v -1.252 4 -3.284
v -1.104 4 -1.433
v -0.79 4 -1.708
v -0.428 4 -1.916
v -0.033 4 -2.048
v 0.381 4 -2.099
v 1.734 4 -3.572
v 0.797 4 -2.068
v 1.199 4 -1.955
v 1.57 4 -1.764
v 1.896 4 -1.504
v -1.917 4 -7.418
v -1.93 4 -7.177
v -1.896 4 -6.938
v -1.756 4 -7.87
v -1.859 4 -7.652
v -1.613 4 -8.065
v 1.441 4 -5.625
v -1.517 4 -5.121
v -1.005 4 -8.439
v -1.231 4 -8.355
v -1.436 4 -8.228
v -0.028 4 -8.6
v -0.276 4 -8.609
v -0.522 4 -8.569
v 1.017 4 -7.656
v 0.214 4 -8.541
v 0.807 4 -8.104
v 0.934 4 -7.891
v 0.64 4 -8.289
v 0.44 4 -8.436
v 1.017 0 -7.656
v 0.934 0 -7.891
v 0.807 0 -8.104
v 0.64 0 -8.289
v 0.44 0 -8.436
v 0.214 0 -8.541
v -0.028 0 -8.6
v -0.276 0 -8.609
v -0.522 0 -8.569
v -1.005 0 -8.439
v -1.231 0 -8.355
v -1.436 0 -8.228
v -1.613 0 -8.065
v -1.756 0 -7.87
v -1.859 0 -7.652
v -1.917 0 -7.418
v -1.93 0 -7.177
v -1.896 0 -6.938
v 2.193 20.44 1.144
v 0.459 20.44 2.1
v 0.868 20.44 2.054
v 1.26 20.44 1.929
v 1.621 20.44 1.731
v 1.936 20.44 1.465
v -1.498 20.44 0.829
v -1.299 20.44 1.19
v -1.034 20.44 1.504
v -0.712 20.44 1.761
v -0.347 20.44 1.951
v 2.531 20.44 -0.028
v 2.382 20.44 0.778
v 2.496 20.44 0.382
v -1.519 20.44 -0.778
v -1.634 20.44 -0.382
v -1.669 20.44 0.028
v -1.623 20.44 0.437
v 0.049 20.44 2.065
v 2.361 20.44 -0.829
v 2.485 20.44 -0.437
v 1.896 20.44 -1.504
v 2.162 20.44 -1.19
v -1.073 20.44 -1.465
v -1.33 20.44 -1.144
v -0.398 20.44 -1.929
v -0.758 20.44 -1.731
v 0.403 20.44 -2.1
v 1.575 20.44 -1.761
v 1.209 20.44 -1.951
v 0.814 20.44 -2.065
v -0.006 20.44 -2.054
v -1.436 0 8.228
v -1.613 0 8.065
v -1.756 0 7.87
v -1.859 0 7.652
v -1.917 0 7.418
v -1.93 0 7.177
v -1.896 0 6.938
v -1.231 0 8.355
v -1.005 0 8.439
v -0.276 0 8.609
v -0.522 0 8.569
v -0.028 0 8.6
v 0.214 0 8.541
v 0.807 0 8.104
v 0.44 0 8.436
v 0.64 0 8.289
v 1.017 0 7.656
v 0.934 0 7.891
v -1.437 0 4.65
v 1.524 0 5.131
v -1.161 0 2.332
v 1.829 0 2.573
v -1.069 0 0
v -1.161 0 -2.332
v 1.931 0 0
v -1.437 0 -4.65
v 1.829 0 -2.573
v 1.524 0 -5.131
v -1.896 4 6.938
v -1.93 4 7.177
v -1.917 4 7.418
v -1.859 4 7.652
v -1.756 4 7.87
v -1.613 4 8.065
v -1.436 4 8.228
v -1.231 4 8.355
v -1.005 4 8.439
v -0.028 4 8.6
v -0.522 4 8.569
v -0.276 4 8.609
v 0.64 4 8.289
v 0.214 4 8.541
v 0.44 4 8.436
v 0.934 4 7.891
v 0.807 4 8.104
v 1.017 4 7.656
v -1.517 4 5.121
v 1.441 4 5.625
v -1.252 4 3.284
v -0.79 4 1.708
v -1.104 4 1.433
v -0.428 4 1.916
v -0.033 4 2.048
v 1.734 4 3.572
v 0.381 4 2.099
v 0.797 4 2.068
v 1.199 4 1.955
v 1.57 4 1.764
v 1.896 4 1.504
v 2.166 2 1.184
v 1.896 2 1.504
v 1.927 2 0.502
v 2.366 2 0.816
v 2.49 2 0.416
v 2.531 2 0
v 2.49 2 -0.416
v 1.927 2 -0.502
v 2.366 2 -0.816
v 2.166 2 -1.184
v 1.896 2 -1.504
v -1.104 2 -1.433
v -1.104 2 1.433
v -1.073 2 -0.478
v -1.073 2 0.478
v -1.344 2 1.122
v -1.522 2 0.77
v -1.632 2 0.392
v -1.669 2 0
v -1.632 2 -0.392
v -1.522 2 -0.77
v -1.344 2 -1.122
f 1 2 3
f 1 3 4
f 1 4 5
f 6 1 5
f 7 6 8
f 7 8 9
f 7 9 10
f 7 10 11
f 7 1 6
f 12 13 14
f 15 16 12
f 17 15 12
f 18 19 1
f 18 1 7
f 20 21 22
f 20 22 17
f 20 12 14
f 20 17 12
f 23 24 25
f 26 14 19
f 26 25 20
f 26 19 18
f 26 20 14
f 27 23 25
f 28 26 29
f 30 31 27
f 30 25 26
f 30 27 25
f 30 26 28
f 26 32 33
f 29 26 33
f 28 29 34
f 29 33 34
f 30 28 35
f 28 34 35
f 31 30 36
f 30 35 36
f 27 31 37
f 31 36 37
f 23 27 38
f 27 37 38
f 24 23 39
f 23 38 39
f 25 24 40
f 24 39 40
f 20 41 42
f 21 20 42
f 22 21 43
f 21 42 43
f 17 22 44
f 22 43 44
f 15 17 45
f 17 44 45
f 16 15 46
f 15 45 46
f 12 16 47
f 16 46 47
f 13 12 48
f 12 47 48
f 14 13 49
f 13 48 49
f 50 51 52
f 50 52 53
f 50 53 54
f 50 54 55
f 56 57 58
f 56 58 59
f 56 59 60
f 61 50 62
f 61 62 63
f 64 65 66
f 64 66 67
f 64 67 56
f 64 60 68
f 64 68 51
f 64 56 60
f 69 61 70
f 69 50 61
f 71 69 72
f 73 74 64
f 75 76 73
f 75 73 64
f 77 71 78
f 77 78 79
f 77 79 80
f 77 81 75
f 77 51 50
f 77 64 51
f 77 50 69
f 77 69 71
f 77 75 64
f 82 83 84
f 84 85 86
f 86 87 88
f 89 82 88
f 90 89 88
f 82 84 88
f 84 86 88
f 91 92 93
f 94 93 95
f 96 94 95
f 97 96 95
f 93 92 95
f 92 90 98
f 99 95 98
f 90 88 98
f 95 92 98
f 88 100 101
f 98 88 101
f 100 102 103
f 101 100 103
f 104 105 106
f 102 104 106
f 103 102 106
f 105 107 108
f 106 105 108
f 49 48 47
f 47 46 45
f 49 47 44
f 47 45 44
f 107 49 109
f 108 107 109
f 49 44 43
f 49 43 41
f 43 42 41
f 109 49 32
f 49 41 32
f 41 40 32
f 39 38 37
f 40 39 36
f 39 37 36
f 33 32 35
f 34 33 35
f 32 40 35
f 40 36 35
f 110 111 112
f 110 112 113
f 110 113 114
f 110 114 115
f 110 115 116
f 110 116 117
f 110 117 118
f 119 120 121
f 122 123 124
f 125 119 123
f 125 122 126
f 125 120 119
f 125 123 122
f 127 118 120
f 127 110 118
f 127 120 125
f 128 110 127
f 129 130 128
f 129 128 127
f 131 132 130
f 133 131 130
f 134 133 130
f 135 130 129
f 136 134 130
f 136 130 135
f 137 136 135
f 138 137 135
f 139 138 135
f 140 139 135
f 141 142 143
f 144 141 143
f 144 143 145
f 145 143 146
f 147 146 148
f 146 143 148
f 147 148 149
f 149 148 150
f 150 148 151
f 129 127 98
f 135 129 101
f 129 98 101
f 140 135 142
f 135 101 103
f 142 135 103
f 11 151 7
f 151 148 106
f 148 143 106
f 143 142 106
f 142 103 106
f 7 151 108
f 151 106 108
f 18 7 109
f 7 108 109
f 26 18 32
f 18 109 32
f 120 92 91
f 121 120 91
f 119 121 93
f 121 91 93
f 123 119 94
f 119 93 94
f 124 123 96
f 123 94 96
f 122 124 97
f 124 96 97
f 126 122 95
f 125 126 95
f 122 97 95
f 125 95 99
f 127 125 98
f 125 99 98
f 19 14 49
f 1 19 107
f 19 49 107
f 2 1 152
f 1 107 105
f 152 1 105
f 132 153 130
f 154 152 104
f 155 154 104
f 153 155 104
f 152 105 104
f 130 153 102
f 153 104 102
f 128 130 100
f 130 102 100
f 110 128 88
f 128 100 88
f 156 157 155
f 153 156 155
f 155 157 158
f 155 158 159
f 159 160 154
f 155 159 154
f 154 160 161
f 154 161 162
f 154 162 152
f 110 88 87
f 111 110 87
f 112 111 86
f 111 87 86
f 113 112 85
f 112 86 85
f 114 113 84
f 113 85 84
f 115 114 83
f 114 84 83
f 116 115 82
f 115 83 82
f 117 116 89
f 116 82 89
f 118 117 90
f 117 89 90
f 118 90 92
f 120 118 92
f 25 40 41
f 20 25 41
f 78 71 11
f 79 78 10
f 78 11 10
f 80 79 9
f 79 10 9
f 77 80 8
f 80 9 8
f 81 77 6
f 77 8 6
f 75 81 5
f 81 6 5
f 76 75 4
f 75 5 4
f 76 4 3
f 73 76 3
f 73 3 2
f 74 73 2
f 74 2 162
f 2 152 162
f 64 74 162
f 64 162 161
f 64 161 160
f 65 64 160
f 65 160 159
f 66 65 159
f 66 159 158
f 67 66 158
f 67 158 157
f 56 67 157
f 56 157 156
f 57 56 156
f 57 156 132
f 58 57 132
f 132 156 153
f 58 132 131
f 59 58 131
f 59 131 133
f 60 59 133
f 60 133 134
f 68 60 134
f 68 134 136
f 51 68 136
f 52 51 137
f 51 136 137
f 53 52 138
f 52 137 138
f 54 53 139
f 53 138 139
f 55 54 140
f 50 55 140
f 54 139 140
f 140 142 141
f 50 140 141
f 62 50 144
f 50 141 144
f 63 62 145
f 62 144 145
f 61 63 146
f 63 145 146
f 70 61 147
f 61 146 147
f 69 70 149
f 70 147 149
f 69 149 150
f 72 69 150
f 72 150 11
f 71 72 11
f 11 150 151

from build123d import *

# Parameters (mm, degrees)
EXTRUDE_1_DEPTH = 4
SKETCH_2_R      = 2.1
EXTRUDE_2_DEPTH = 18.44


with BuildPart() as part:
    # Эскиз1 → Бобышка-Вытянуть1 (new body)
    with BuildSketch(Plane(origin=(0, 0, 0), x_dir=(1, 0, 0), z_dir=(0, 1, 0))):
        with BuildLine():
            Line((-1.004775086, -8.439280951), (-0.521670756, -8.568728366))
            ThreePointArc((-0.521670756, -8.568728366), (0.439799359, -8.436274341), (1.016677121, -7.655773926))
            ThreePointArc((1.016677121, -7.655773926), (1.93125128, 0), (1.016677121, 7.655773926))
            ThreePointArc((1.016677121, 7.655773926), (0.439799359, 8.436274341), (-0.521670756, 8.568728366))
            Line((-0.521670756, 8.568728366), (-1.004775086, 8.439280951))
            ThreePointArc((-1.004775086, 8.439280951), (-1.756080004, 7.870029772), (-1.8961902, 6.937895063))
            ThreePointArc((-1.8961902, 6.937895063), (-1.06874872, 0), (-1.8961902, -6.937895063))
            ThreePointArc((-1.8961902, -6.937895063), (-1.756080004, -7.870029772), (-1.004775086, -8.439280951))
        make_face()
    extrude(amount=EXTRUDE_1_DEPTH)

    # Эскиз2 → Бобышка-Вытянуть2 (add)
    with BuildSketch(Plane(origin=(0, 2, 0), x_dir=(1, 0, 0), z_dir=(0, 1, 0))):
        with Locations(Location((0.43125128, 0, 0), (0, 0, 45.757566992))):
            Circle(SKETCH_2_R)
    extrude(amount=EXTRUDE_2_DEPTH)


solid = part.part
